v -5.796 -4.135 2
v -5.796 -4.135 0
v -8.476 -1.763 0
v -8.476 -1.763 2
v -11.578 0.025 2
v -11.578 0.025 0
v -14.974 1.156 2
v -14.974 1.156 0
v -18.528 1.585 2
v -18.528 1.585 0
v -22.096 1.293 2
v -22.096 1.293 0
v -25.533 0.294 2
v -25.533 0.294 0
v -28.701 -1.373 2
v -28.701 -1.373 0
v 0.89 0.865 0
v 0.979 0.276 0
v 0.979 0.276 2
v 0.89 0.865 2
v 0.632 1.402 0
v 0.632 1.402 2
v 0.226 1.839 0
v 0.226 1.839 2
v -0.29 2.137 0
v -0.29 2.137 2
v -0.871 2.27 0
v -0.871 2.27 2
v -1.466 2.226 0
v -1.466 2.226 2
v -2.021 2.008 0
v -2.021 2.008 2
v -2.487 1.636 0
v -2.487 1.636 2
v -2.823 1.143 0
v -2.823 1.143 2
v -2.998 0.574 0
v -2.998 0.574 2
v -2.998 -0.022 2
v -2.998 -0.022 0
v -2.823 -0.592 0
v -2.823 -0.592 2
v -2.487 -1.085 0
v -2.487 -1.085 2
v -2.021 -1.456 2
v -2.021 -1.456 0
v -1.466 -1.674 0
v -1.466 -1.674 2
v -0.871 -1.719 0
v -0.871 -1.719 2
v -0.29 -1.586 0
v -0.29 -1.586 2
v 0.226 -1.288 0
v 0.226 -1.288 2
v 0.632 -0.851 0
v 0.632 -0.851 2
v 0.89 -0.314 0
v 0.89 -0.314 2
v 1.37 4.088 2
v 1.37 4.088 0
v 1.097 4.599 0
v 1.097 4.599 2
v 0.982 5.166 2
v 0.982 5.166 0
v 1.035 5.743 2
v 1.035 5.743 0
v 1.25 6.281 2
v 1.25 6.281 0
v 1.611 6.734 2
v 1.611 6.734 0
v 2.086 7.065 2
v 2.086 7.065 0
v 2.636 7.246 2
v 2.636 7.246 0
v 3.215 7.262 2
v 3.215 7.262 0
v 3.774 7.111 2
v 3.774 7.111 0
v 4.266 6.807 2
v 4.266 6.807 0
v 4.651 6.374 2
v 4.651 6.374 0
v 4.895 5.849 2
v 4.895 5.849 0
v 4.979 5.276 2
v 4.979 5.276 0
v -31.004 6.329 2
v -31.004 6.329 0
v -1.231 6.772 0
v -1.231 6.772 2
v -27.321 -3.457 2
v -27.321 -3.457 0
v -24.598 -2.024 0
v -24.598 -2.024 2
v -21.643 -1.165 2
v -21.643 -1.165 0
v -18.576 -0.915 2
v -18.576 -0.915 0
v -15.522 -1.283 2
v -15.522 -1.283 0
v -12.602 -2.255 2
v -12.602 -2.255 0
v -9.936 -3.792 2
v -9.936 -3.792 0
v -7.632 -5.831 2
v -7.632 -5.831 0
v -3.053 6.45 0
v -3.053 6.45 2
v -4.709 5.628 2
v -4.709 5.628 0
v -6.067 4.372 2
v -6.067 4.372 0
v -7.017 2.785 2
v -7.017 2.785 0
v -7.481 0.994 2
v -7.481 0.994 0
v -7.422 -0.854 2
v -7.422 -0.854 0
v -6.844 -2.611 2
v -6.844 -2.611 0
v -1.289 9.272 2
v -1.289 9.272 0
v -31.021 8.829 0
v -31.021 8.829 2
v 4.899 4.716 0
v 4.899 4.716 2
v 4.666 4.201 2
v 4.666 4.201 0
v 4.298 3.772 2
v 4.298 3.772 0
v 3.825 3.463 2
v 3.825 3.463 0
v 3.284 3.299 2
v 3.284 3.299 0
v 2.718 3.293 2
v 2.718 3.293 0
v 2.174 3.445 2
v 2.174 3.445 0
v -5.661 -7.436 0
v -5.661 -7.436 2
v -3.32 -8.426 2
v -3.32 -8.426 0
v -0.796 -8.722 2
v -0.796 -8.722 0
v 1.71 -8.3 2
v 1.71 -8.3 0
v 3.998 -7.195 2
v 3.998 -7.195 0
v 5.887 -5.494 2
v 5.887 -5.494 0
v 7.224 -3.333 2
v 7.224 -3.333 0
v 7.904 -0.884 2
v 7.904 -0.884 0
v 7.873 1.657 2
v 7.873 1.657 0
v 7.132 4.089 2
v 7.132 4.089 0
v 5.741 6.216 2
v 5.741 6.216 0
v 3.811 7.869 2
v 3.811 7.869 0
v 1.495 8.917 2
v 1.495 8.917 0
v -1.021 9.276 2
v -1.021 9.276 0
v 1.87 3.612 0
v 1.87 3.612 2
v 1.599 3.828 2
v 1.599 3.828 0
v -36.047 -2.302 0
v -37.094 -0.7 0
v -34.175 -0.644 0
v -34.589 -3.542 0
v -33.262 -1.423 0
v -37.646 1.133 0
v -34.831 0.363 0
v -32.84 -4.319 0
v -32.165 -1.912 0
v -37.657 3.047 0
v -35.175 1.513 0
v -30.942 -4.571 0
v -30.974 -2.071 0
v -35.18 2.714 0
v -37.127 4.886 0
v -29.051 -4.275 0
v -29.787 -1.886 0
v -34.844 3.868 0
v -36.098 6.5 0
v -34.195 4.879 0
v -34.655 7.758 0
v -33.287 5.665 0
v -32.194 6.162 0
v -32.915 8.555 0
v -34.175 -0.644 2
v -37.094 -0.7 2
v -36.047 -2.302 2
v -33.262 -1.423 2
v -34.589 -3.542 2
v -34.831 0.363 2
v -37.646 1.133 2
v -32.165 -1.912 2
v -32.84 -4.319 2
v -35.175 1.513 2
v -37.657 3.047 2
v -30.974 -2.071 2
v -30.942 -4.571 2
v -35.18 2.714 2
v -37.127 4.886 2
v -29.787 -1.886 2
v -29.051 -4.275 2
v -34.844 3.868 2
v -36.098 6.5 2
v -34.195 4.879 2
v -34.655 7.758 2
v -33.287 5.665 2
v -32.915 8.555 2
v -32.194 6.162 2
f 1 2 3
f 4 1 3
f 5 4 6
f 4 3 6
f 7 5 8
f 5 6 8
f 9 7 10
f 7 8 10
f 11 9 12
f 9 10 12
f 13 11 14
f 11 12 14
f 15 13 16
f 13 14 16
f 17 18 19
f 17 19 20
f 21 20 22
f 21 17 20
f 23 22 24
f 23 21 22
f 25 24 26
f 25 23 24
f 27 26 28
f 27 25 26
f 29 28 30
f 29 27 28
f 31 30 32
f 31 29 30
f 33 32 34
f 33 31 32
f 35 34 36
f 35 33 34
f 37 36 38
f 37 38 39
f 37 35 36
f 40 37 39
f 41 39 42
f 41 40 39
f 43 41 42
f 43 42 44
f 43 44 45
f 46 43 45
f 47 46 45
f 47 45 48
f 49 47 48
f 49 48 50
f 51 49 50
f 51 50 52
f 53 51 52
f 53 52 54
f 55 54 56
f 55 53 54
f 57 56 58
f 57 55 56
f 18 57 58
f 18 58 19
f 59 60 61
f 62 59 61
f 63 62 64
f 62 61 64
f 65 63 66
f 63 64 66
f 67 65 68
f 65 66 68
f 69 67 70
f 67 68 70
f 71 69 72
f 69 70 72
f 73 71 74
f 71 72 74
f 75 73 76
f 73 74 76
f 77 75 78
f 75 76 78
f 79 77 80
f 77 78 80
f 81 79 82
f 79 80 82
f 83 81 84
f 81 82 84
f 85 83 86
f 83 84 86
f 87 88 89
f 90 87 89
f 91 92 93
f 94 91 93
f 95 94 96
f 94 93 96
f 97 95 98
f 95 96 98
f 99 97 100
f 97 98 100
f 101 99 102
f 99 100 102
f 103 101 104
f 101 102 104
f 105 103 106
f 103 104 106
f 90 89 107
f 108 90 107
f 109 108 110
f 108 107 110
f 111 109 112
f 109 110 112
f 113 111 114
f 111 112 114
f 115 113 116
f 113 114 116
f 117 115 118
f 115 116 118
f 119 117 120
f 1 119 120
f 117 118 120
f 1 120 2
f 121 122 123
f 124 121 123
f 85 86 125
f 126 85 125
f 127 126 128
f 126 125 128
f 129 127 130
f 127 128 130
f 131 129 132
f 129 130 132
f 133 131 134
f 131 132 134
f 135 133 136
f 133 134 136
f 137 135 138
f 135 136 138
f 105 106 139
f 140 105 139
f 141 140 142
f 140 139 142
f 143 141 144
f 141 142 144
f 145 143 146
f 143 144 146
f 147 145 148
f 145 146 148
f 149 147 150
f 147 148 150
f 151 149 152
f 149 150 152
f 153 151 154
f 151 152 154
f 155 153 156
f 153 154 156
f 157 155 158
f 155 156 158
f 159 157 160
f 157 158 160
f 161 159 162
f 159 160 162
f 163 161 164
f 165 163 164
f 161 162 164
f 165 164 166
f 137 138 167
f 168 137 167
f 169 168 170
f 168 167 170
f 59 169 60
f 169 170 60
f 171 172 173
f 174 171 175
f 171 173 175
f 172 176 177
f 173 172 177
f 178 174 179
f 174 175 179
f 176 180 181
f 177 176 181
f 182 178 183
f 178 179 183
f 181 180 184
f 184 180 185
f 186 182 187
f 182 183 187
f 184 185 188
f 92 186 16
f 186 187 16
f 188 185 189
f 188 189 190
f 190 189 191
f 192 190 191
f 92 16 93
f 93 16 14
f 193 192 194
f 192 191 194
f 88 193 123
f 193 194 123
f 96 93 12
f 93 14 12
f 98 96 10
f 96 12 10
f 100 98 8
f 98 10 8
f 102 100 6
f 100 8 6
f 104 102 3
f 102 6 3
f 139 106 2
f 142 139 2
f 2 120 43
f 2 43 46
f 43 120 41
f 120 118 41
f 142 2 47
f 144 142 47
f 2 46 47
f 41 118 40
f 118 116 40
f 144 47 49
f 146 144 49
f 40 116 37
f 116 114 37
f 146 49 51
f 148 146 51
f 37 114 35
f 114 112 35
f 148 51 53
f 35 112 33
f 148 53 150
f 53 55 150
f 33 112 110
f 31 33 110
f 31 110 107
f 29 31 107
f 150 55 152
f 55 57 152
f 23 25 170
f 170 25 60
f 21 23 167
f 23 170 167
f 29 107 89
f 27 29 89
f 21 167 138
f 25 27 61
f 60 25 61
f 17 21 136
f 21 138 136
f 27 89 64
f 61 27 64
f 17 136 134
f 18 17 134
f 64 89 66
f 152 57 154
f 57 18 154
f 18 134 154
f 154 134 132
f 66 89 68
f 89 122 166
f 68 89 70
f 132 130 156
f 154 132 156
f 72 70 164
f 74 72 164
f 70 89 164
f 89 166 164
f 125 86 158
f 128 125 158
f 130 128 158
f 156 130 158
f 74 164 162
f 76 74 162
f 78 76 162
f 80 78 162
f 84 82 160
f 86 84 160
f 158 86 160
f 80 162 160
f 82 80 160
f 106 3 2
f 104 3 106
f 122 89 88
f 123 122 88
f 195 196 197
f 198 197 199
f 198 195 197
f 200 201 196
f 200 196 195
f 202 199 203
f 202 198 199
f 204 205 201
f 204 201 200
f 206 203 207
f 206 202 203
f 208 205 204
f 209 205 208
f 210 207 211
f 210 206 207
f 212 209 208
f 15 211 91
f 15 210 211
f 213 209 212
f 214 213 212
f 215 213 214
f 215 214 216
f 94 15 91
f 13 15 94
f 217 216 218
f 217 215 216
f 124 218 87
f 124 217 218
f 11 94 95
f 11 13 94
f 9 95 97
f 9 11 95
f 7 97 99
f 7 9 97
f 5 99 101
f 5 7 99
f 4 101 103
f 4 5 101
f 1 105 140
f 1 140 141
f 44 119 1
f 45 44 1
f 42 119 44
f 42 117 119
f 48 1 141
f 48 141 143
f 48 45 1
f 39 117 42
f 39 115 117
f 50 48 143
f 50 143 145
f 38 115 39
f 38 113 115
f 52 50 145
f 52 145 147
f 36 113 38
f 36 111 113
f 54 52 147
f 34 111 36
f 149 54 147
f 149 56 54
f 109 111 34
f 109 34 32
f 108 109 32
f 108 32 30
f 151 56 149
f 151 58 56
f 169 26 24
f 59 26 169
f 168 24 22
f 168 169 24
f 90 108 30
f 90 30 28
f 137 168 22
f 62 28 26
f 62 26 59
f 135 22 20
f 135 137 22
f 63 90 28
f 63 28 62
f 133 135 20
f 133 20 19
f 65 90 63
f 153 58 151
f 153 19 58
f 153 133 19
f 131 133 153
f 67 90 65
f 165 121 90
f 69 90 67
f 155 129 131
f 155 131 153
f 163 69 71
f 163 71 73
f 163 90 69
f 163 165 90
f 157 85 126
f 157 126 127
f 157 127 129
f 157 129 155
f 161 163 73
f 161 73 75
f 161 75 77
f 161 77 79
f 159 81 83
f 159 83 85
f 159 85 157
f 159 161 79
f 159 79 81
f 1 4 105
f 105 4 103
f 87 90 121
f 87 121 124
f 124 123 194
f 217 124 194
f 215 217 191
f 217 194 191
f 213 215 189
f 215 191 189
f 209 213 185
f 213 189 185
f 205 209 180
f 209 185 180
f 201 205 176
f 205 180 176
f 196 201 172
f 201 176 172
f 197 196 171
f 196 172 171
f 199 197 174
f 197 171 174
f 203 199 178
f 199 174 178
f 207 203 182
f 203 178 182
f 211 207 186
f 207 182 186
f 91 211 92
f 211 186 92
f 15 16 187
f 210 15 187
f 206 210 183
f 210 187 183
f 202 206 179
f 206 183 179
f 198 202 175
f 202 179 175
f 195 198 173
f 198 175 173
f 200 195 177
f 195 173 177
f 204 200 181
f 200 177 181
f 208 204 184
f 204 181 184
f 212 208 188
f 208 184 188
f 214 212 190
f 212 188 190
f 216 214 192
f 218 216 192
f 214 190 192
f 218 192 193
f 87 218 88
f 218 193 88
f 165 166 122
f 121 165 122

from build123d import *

# Parameters (mm, degrees)
SKETCH1_R           = 2
BOSS_EXTRUDE1_DEPTH = 2


with BuildPart() as part:
    # Sketch1 → Boss-Extrude1 (new body)
    with BuildSketch(Plane.XY):
        with BuildLine():
            Line((-1.2887257, 9.27170727), (-31.0207003, 8.828891045))
            ThreePointArc((-31.0207003, 8.828891045), (-37.4360697, 0.196784564), (-27.320647525, -3.456770014))
            ThreePointArc((-27.320647525, -3.456770014), (-17.039618289, -1.022120458), (-7.632023625, -5.830887792))
            ThreePointArc((-7.632023625, -5.830887792), (7.224276423, -3.332674299), (-1.0207003, 9.275699134))
            Line((-1.0207003, 9.275699134), (-1.2887257, 9.27170727))
        make_face()
        with BuildLine():
            ThreePointArc((-28.701264232, -1.372568126), (-35.044639656, 0.925598871), (-31.004247939, 6.328858821))
            Line((-31.004247939, 6.328858821), (-1.231370803, 6.772284233))
            ThreePointArc((-1.231370803, 6.772284233), (-7.016861205, 2.784893108), (-5.795544924, -4.134613646))
            ThreePointArc((-5.795544924, -4.134613646), (-16.740328258, 1.459899985), (-28.701264232, -1.372568126))
        make_face(mode=Mode.SUBTRACT)
        with Locations((-1.0207003, 0.275699134)):
            Circle(SKETCH1_R, mode=Mode.SUBTRACT)
        with BuildLine():
            ThreePointArc((1.370109873, 4.088050996), (2.354151579, 7.175485919), (4.9792997, 5.275699134))
            ThreePointArc((4.9792997, 5.275699134), (4.07225701, 3.60075307), (2.173855381, 3.44505459))
            ThreePointArc((2.173855381, 3.44505459), (1.729909605, 3.713961516), (1.370109873, 4.088050996))
        make_face(mode=Mode.SUBTRACT)
    extrude(amount=BOSS_EXTRUDE1_DEPTH)


solid = part.part
